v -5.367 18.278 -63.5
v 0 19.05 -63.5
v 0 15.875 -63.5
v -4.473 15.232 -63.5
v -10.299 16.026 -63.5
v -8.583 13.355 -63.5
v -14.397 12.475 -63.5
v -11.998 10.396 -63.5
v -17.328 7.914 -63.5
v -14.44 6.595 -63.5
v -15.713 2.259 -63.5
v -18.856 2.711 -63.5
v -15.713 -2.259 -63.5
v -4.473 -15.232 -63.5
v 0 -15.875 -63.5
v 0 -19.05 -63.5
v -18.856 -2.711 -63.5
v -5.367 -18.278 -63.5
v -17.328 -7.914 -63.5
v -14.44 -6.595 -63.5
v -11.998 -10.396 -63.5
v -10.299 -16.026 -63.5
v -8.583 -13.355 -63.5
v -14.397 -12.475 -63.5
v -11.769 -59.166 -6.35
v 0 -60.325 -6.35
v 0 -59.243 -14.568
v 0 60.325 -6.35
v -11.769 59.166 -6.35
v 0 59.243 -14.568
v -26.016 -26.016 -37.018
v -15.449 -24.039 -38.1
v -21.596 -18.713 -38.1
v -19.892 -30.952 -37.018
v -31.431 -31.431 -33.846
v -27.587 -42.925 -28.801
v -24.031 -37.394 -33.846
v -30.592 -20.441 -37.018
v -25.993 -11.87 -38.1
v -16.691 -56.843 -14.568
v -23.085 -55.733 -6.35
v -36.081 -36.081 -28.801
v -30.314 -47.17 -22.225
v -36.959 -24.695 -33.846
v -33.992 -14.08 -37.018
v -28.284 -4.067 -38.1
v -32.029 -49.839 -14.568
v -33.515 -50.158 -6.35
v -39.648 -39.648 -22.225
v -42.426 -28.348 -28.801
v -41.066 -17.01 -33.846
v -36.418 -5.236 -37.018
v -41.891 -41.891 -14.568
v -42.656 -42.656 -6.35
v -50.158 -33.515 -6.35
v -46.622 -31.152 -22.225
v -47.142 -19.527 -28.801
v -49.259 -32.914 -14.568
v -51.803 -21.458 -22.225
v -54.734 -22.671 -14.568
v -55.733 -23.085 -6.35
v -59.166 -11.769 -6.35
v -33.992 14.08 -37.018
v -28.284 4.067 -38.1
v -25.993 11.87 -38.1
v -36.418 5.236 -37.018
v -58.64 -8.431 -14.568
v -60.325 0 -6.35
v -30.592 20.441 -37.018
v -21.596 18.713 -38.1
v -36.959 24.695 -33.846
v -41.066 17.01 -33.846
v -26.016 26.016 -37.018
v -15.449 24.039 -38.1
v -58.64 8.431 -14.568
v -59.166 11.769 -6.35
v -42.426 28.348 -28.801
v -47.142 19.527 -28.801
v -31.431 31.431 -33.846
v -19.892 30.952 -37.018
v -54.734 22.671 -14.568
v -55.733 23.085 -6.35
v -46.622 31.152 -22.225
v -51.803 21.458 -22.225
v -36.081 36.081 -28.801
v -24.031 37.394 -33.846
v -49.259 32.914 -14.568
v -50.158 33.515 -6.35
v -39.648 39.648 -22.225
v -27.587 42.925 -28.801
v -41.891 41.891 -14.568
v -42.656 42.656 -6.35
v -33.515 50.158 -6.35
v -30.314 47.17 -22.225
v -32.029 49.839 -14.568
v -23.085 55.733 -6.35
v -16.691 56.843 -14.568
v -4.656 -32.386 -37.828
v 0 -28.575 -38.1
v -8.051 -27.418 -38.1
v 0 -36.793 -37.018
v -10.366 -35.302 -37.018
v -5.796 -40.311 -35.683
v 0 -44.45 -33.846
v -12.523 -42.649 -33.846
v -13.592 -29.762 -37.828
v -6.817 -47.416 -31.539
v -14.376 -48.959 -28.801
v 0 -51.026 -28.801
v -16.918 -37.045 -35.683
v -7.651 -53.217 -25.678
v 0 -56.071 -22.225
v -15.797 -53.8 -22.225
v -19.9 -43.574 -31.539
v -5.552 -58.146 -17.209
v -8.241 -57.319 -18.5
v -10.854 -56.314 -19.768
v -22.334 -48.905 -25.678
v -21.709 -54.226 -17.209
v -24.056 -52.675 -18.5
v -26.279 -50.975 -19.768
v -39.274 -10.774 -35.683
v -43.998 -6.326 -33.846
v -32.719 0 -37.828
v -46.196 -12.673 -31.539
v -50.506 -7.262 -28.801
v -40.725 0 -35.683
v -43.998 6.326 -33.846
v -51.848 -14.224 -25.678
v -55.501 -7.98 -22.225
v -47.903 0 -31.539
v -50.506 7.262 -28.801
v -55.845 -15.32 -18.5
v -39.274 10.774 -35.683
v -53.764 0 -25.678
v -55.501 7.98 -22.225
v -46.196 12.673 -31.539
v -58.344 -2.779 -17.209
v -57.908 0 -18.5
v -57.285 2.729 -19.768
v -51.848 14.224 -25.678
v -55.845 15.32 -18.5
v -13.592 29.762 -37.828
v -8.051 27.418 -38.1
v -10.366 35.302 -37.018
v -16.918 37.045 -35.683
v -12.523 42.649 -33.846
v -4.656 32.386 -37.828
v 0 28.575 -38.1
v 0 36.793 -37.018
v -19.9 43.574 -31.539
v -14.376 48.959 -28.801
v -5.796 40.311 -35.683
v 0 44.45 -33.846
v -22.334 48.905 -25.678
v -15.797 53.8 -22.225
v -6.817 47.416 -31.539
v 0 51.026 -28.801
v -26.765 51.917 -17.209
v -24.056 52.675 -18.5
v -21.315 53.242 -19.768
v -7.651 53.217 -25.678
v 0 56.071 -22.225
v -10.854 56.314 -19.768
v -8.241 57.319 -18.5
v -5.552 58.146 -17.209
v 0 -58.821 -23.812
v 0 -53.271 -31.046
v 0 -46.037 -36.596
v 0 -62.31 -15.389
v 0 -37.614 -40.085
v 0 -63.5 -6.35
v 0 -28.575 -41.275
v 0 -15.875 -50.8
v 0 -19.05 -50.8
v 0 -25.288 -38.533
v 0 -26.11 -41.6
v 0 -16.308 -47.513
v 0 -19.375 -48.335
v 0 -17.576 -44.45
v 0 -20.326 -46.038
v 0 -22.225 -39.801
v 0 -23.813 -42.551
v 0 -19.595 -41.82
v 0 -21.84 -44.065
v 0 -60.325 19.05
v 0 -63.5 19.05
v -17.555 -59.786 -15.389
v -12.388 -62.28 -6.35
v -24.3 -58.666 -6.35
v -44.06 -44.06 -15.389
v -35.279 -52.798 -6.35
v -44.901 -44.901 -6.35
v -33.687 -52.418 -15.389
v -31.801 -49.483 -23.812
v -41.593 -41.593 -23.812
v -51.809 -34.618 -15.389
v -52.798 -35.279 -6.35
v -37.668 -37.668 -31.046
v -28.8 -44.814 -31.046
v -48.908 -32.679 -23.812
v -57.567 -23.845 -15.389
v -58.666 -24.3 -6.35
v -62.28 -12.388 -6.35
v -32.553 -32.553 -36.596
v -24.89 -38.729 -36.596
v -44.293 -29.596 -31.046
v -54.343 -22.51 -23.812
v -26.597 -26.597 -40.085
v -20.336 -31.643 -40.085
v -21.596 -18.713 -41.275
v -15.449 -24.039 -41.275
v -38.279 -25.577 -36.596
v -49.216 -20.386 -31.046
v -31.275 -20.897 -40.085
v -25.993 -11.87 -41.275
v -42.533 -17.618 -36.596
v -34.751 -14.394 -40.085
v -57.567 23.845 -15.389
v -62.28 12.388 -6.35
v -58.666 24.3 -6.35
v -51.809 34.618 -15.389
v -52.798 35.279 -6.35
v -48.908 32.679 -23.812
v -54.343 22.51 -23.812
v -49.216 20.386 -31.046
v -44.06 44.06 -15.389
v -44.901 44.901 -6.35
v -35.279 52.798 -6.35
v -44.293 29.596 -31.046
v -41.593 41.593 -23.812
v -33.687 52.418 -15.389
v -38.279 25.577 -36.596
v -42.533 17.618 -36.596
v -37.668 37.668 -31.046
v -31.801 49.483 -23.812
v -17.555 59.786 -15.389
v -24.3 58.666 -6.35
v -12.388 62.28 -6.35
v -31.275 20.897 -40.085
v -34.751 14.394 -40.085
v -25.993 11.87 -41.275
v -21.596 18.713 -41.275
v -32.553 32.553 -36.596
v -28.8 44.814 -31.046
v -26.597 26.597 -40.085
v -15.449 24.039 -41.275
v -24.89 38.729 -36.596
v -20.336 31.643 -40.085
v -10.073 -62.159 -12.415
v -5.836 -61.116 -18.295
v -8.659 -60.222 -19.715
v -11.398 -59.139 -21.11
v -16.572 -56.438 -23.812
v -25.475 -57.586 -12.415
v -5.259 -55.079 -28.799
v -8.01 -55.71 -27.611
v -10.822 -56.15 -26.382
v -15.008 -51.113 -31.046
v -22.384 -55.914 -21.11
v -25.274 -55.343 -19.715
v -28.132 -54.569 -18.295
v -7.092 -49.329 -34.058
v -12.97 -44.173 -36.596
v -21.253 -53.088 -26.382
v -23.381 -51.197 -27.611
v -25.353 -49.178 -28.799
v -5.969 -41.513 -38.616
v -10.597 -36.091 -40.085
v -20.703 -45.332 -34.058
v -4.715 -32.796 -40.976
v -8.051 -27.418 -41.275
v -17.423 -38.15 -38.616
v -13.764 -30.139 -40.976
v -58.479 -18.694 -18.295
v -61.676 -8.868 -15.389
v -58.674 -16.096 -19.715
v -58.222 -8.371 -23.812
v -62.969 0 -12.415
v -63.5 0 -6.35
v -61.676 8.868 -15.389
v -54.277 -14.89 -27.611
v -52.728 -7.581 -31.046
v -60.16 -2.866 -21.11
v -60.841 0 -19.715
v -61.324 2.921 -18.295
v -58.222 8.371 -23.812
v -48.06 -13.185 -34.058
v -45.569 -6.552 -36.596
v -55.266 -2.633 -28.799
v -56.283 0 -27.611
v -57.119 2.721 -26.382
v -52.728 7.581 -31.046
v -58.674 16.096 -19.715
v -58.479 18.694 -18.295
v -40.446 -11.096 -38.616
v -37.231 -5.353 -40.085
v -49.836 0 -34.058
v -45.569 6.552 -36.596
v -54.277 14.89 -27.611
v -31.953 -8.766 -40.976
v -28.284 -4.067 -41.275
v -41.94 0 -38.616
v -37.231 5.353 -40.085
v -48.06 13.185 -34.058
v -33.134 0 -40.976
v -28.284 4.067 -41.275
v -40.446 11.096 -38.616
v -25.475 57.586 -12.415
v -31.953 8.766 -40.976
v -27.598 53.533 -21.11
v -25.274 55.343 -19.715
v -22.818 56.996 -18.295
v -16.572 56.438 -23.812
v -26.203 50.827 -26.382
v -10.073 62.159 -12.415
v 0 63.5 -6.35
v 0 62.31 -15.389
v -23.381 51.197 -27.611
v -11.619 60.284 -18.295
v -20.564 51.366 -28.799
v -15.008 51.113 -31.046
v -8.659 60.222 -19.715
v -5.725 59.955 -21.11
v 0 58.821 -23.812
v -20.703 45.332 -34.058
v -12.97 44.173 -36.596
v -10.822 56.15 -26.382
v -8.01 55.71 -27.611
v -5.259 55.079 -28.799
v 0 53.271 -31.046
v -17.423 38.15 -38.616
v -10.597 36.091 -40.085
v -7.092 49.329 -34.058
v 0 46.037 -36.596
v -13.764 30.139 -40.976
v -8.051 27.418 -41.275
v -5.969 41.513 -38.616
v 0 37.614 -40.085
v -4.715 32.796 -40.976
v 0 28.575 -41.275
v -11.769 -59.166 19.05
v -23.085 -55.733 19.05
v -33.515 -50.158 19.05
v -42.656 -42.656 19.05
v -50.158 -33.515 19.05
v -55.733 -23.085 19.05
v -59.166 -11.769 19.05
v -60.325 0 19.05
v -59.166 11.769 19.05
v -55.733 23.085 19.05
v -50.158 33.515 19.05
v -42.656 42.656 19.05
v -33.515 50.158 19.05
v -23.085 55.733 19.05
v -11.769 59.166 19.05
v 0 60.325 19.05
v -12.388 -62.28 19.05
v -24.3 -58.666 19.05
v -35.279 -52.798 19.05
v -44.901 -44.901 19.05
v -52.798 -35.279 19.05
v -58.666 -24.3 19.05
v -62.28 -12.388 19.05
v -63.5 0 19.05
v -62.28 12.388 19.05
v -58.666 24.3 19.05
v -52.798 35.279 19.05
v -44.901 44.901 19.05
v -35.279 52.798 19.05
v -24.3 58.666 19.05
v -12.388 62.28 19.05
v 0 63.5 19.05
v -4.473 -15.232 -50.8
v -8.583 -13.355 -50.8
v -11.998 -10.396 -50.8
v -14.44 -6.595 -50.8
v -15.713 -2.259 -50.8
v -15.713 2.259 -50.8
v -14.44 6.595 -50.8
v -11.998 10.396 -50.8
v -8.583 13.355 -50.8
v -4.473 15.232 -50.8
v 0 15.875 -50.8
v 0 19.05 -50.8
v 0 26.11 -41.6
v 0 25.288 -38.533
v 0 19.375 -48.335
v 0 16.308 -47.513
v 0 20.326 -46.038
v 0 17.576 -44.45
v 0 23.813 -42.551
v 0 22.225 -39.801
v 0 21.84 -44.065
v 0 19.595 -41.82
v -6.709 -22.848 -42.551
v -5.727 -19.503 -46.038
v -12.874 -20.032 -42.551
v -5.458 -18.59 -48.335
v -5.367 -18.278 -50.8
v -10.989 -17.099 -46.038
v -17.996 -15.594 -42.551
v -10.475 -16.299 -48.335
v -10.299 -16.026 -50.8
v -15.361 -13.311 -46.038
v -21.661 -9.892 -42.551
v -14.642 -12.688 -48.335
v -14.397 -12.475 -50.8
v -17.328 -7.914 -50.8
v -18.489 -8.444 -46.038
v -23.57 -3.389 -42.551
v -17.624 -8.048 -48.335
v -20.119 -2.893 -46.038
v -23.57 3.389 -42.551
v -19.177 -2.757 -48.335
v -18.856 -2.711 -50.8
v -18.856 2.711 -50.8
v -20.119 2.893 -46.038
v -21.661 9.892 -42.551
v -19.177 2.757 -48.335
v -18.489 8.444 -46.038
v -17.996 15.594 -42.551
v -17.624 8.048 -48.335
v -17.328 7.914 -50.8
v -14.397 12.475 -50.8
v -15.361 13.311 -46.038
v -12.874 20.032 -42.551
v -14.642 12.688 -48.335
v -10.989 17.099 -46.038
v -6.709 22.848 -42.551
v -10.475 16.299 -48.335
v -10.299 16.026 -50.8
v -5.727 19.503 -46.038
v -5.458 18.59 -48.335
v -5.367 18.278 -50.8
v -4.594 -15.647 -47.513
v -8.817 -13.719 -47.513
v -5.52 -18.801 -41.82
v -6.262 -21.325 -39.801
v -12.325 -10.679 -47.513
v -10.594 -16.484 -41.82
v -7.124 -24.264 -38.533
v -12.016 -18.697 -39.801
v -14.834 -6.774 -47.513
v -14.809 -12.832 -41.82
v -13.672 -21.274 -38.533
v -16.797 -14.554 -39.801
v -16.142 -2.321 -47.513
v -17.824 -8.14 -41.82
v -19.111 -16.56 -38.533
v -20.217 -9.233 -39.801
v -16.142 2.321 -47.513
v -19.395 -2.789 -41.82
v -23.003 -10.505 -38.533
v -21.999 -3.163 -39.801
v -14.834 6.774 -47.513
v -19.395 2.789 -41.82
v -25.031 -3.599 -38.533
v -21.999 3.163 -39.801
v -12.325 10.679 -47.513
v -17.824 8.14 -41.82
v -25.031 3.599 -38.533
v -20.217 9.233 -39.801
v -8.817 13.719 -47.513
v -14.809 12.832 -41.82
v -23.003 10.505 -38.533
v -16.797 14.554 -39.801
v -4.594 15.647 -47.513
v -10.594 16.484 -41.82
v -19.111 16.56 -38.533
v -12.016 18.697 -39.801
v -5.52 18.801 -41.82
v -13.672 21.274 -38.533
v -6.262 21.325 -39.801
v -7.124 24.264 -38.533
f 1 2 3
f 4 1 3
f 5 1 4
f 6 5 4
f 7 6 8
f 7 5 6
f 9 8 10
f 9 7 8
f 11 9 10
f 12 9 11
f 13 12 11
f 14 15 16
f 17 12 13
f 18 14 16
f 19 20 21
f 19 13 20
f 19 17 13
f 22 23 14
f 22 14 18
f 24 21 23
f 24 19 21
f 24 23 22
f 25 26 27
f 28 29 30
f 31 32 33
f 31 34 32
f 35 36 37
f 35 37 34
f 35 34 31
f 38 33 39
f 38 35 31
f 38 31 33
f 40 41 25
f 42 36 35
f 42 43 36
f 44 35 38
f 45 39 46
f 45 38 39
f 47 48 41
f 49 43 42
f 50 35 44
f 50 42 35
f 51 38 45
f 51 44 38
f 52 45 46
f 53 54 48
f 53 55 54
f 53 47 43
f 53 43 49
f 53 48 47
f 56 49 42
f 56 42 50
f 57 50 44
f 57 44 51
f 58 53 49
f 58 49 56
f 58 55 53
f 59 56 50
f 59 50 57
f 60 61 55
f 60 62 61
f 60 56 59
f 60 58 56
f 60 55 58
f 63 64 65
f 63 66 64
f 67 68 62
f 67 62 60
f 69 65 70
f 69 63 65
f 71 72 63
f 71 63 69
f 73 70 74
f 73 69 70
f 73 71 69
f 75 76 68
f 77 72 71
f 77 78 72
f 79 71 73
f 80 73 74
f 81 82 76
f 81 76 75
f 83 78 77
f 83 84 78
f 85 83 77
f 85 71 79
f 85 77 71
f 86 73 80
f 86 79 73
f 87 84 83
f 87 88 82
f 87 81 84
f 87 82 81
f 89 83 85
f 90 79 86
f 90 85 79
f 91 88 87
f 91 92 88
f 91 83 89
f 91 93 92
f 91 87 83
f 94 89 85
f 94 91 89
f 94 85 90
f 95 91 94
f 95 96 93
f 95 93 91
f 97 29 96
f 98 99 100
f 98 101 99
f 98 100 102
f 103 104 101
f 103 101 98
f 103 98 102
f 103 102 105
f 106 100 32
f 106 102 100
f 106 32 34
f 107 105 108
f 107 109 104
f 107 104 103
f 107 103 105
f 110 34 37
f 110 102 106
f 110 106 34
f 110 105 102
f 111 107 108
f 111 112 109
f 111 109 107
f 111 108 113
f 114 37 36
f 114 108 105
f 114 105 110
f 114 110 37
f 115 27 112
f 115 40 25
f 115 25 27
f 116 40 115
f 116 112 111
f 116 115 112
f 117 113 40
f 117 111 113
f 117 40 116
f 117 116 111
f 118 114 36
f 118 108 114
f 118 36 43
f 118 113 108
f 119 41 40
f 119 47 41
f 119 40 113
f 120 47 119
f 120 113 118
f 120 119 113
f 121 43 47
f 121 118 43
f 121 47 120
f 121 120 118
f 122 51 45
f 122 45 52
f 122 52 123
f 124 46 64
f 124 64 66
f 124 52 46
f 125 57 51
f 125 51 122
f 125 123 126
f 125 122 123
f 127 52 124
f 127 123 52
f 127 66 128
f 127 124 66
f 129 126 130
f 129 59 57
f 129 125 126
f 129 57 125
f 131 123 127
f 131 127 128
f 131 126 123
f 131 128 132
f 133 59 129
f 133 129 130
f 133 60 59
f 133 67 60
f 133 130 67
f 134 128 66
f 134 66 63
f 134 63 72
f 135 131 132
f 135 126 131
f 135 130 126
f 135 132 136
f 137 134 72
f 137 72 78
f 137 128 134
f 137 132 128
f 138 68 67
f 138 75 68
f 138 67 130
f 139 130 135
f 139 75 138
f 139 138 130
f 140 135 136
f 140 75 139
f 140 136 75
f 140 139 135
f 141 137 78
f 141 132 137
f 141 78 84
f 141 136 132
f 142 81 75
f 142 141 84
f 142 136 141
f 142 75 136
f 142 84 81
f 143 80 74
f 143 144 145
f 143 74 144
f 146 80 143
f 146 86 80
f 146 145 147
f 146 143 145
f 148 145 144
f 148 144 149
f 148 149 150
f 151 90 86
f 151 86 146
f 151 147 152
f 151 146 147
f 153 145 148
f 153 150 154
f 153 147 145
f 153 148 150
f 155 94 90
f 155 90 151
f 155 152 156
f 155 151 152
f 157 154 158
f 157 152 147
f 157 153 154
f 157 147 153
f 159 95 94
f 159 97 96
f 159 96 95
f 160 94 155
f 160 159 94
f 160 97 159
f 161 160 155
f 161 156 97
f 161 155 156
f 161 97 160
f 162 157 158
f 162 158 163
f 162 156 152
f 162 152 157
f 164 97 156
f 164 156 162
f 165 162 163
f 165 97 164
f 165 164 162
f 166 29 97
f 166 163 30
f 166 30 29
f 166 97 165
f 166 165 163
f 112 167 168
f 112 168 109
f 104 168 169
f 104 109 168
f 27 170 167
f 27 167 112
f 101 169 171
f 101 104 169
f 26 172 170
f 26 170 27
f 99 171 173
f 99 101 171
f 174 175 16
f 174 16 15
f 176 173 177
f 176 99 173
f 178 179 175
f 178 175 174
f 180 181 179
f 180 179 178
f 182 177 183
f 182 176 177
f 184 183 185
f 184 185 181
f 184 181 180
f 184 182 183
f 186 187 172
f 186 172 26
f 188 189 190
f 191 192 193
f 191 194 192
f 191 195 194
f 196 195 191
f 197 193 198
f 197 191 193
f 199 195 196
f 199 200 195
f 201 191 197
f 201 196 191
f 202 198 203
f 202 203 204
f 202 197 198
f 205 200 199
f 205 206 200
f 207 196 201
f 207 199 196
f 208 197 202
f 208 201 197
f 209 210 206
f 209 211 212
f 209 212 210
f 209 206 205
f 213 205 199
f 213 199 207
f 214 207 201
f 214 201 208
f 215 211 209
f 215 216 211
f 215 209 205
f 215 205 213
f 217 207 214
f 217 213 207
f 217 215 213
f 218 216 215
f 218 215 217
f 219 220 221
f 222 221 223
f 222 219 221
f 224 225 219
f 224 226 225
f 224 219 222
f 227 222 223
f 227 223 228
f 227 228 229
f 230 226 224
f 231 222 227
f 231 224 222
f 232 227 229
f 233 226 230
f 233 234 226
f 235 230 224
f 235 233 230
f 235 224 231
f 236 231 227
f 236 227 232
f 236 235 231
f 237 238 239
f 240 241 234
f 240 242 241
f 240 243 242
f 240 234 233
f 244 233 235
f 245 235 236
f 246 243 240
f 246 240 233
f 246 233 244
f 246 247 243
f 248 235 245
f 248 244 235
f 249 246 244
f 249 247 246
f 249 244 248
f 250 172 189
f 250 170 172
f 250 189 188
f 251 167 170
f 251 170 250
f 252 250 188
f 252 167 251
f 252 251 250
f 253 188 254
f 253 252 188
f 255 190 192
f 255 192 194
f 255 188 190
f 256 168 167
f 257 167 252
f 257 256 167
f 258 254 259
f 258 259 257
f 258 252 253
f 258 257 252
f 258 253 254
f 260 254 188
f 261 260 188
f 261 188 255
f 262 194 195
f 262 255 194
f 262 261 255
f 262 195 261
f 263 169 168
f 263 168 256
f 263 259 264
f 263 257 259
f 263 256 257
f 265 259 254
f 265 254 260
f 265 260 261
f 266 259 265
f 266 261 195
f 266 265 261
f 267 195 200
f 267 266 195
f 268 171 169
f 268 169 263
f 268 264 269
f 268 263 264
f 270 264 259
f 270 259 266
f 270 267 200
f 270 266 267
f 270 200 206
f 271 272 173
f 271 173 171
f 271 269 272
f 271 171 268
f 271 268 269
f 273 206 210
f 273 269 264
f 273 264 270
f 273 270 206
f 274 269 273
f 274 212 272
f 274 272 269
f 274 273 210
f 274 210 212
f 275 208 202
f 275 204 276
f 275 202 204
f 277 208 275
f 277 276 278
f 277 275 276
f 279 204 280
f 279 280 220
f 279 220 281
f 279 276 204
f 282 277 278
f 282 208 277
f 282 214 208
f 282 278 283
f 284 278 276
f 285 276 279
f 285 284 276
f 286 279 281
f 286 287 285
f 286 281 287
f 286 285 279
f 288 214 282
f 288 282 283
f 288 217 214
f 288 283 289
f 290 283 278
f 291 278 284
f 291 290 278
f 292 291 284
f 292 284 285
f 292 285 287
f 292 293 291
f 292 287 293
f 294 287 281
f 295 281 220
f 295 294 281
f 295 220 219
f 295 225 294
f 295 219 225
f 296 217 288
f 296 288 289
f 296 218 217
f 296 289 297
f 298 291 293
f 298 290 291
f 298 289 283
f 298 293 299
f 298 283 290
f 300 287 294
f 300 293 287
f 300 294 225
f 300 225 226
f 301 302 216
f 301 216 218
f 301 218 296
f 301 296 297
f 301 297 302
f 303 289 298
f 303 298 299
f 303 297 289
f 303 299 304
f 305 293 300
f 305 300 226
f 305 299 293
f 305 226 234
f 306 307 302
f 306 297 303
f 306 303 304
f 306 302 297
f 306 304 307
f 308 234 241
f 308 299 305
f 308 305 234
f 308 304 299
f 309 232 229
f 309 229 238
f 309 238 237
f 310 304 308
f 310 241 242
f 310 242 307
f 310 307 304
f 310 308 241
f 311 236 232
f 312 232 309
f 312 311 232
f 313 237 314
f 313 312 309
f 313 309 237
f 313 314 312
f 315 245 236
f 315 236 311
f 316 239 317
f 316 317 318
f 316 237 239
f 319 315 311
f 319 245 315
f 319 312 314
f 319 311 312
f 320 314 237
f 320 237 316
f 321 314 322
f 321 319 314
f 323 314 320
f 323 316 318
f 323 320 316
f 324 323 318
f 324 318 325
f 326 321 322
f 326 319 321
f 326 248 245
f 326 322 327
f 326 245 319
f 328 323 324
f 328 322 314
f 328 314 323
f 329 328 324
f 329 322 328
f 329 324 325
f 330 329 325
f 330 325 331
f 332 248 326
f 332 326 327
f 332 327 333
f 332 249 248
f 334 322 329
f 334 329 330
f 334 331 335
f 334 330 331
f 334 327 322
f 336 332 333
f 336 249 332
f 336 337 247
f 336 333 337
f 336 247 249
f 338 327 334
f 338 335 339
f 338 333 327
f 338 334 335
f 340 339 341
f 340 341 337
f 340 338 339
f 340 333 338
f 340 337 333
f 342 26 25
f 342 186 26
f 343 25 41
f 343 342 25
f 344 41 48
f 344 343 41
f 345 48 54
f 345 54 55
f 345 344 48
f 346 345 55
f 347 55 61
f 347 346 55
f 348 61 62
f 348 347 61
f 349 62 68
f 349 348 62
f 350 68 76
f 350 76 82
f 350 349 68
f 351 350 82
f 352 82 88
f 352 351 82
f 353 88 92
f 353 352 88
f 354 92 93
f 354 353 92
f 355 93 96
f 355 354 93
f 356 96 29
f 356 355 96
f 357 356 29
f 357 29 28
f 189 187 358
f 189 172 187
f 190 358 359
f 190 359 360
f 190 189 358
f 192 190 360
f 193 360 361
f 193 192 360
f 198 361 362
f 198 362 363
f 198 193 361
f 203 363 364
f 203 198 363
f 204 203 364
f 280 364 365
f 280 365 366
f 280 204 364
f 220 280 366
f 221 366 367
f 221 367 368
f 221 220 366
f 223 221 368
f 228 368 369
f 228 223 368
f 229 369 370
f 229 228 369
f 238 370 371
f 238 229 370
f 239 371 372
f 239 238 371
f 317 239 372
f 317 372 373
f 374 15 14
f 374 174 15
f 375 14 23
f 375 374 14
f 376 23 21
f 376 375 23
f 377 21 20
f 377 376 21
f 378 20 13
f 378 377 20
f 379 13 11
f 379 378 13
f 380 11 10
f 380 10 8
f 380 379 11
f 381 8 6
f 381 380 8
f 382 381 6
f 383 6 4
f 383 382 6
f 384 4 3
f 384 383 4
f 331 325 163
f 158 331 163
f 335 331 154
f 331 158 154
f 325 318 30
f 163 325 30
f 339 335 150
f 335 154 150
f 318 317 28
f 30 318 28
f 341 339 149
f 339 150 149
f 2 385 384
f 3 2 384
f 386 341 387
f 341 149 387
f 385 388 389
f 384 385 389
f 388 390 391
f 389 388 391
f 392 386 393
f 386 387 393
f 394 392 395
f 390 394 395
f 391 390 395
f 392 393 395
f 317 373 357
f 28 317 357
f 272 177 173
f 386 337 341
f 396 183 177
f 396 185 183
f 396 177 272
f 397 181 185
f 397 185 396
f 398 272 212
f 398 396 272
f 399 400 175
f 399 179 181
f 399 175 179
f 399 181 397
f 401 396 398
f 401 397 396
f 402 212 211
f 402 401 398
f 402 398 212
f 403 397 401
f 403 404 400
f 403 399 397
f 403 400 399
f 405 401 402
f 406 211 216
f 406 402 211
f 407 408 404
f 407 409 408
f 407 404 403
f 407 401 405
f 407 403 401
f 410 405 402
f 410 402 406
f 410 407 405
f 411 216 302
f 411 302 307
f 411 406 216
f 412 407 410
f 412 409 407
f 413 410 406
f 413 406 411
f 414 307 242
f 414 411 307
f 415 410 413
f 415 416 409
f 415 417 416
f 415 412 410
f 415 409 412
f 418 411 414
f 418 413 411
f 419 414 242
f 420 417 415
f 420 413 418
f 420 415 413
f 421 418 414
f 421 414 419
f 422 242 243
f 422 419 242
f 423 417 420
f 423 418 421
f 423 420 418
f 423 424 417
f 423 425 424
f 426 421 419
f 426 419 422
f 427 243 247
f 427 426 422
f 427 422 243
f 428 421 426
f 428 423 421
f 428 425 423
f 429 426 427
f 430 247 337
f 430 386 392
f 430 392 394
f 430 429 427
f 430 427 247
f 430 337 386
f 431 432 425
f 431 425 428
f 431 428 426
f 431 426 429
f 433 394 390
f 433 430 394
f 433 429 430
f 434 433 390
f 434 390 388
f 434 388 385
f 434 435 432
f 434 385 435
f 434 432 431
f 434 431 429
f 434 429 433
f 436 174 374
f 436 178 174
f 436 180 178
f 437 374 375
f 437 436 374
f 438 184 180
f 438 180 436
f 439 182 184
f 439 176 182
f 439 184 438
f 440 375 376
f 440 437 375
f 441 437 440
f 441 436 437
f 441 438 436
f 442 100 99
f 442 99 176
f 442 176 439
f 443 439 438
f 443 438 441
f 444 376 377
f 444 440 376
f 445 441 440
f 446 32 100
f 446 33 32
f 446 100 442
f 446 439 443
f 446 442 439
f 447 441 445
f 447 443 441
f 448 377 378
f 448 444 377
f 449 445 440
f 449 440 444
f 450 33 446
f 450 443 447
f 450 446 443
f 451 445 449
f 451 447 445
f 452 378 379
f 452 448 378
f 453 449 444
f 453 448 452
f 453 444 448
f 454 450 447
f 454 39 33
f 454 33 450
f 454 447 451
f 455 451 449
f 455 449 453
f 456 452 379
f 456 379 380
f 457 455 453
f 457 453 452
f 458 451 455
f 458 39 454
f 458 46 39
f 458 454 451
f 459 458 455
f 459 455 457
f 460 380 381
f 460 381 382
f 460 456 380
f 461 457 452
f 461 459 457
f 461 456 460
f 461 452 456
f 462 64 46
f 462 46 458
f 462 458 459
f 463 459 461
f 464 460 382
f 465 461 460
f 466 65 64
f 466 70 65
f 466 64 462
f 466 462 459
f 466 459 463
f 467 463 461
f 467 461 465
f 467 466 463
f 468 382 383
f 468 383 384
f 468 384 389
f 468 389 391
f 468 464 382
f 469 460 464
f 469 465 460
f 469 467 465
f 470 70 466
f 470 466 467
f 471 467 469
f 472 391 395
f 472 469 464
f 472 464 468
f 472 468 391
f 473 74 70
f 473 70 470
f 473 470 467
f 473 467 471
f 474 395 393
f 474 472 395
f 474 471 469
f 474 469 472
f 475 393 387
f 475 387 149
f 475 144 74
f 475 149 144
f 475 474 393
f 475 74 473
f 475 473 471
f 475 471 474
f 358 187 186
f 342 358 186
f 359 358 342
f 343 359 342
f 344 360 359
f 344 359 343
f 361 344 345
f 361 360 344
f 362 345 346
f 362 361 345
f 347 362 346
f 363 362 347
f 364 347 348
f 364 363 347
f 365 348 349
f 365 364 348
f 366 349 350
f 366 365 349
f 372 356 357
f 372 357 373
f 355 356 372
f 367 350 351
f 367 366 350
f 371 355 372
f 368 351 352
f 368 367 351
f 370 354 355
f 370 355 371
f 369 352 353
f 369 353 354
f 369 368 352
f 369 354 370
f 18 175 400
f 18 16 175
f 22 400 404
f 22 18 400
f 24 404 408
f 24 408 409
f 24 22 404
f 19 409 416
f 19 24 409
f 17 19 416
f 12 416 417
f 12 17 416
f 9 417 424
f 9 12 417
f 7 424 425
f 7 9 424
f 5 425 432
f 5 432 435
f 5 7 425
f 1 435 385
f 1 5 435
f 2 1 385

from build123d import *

# Parameters (mm, degrees)
F1_ANGLE = 180


with BuildPart() as f1:
    # F0 (on Right) → F1 (revolve)
    with BuildSketch(Plane.YZ):
        with BuildLine():
            Line((-60.325, -6.35), (-60.325, 19.05))
            Line((-60.325, 19.05), (-63.5, 19.05))
            Line((-63.5, 19.05), (-63.5, -6.35))
            ThreePointArc((-63.5, -6.35), (-53.270704, -31.045704), (-28.575, -41.275))
            ThreePointArc((-28.575, -41.275), (-21.839808, -44.064808), (-19.05, -50.8))
            Line((-19.05, -50.8), (-19.05, -63.5))
            Line((-19.05, -63.5), (-15.875, -63.5))
            Line((-15.875, -63.5), (-15.875, -50.8))
            ThreePointArc((-15.875, -50.8), (-19.594744, -41.819744), (-28.575, -38.1))
            ThreePointArc((-28.575, -38.1), (-51.02564, -28.80064), (-60.325, -6.35))
        make_face()
    revolve(axis=Axis((0, 0, -17.790621), (0, 0, -1)), revolution_arc=F1_ANGLE)


solid = f1.part
